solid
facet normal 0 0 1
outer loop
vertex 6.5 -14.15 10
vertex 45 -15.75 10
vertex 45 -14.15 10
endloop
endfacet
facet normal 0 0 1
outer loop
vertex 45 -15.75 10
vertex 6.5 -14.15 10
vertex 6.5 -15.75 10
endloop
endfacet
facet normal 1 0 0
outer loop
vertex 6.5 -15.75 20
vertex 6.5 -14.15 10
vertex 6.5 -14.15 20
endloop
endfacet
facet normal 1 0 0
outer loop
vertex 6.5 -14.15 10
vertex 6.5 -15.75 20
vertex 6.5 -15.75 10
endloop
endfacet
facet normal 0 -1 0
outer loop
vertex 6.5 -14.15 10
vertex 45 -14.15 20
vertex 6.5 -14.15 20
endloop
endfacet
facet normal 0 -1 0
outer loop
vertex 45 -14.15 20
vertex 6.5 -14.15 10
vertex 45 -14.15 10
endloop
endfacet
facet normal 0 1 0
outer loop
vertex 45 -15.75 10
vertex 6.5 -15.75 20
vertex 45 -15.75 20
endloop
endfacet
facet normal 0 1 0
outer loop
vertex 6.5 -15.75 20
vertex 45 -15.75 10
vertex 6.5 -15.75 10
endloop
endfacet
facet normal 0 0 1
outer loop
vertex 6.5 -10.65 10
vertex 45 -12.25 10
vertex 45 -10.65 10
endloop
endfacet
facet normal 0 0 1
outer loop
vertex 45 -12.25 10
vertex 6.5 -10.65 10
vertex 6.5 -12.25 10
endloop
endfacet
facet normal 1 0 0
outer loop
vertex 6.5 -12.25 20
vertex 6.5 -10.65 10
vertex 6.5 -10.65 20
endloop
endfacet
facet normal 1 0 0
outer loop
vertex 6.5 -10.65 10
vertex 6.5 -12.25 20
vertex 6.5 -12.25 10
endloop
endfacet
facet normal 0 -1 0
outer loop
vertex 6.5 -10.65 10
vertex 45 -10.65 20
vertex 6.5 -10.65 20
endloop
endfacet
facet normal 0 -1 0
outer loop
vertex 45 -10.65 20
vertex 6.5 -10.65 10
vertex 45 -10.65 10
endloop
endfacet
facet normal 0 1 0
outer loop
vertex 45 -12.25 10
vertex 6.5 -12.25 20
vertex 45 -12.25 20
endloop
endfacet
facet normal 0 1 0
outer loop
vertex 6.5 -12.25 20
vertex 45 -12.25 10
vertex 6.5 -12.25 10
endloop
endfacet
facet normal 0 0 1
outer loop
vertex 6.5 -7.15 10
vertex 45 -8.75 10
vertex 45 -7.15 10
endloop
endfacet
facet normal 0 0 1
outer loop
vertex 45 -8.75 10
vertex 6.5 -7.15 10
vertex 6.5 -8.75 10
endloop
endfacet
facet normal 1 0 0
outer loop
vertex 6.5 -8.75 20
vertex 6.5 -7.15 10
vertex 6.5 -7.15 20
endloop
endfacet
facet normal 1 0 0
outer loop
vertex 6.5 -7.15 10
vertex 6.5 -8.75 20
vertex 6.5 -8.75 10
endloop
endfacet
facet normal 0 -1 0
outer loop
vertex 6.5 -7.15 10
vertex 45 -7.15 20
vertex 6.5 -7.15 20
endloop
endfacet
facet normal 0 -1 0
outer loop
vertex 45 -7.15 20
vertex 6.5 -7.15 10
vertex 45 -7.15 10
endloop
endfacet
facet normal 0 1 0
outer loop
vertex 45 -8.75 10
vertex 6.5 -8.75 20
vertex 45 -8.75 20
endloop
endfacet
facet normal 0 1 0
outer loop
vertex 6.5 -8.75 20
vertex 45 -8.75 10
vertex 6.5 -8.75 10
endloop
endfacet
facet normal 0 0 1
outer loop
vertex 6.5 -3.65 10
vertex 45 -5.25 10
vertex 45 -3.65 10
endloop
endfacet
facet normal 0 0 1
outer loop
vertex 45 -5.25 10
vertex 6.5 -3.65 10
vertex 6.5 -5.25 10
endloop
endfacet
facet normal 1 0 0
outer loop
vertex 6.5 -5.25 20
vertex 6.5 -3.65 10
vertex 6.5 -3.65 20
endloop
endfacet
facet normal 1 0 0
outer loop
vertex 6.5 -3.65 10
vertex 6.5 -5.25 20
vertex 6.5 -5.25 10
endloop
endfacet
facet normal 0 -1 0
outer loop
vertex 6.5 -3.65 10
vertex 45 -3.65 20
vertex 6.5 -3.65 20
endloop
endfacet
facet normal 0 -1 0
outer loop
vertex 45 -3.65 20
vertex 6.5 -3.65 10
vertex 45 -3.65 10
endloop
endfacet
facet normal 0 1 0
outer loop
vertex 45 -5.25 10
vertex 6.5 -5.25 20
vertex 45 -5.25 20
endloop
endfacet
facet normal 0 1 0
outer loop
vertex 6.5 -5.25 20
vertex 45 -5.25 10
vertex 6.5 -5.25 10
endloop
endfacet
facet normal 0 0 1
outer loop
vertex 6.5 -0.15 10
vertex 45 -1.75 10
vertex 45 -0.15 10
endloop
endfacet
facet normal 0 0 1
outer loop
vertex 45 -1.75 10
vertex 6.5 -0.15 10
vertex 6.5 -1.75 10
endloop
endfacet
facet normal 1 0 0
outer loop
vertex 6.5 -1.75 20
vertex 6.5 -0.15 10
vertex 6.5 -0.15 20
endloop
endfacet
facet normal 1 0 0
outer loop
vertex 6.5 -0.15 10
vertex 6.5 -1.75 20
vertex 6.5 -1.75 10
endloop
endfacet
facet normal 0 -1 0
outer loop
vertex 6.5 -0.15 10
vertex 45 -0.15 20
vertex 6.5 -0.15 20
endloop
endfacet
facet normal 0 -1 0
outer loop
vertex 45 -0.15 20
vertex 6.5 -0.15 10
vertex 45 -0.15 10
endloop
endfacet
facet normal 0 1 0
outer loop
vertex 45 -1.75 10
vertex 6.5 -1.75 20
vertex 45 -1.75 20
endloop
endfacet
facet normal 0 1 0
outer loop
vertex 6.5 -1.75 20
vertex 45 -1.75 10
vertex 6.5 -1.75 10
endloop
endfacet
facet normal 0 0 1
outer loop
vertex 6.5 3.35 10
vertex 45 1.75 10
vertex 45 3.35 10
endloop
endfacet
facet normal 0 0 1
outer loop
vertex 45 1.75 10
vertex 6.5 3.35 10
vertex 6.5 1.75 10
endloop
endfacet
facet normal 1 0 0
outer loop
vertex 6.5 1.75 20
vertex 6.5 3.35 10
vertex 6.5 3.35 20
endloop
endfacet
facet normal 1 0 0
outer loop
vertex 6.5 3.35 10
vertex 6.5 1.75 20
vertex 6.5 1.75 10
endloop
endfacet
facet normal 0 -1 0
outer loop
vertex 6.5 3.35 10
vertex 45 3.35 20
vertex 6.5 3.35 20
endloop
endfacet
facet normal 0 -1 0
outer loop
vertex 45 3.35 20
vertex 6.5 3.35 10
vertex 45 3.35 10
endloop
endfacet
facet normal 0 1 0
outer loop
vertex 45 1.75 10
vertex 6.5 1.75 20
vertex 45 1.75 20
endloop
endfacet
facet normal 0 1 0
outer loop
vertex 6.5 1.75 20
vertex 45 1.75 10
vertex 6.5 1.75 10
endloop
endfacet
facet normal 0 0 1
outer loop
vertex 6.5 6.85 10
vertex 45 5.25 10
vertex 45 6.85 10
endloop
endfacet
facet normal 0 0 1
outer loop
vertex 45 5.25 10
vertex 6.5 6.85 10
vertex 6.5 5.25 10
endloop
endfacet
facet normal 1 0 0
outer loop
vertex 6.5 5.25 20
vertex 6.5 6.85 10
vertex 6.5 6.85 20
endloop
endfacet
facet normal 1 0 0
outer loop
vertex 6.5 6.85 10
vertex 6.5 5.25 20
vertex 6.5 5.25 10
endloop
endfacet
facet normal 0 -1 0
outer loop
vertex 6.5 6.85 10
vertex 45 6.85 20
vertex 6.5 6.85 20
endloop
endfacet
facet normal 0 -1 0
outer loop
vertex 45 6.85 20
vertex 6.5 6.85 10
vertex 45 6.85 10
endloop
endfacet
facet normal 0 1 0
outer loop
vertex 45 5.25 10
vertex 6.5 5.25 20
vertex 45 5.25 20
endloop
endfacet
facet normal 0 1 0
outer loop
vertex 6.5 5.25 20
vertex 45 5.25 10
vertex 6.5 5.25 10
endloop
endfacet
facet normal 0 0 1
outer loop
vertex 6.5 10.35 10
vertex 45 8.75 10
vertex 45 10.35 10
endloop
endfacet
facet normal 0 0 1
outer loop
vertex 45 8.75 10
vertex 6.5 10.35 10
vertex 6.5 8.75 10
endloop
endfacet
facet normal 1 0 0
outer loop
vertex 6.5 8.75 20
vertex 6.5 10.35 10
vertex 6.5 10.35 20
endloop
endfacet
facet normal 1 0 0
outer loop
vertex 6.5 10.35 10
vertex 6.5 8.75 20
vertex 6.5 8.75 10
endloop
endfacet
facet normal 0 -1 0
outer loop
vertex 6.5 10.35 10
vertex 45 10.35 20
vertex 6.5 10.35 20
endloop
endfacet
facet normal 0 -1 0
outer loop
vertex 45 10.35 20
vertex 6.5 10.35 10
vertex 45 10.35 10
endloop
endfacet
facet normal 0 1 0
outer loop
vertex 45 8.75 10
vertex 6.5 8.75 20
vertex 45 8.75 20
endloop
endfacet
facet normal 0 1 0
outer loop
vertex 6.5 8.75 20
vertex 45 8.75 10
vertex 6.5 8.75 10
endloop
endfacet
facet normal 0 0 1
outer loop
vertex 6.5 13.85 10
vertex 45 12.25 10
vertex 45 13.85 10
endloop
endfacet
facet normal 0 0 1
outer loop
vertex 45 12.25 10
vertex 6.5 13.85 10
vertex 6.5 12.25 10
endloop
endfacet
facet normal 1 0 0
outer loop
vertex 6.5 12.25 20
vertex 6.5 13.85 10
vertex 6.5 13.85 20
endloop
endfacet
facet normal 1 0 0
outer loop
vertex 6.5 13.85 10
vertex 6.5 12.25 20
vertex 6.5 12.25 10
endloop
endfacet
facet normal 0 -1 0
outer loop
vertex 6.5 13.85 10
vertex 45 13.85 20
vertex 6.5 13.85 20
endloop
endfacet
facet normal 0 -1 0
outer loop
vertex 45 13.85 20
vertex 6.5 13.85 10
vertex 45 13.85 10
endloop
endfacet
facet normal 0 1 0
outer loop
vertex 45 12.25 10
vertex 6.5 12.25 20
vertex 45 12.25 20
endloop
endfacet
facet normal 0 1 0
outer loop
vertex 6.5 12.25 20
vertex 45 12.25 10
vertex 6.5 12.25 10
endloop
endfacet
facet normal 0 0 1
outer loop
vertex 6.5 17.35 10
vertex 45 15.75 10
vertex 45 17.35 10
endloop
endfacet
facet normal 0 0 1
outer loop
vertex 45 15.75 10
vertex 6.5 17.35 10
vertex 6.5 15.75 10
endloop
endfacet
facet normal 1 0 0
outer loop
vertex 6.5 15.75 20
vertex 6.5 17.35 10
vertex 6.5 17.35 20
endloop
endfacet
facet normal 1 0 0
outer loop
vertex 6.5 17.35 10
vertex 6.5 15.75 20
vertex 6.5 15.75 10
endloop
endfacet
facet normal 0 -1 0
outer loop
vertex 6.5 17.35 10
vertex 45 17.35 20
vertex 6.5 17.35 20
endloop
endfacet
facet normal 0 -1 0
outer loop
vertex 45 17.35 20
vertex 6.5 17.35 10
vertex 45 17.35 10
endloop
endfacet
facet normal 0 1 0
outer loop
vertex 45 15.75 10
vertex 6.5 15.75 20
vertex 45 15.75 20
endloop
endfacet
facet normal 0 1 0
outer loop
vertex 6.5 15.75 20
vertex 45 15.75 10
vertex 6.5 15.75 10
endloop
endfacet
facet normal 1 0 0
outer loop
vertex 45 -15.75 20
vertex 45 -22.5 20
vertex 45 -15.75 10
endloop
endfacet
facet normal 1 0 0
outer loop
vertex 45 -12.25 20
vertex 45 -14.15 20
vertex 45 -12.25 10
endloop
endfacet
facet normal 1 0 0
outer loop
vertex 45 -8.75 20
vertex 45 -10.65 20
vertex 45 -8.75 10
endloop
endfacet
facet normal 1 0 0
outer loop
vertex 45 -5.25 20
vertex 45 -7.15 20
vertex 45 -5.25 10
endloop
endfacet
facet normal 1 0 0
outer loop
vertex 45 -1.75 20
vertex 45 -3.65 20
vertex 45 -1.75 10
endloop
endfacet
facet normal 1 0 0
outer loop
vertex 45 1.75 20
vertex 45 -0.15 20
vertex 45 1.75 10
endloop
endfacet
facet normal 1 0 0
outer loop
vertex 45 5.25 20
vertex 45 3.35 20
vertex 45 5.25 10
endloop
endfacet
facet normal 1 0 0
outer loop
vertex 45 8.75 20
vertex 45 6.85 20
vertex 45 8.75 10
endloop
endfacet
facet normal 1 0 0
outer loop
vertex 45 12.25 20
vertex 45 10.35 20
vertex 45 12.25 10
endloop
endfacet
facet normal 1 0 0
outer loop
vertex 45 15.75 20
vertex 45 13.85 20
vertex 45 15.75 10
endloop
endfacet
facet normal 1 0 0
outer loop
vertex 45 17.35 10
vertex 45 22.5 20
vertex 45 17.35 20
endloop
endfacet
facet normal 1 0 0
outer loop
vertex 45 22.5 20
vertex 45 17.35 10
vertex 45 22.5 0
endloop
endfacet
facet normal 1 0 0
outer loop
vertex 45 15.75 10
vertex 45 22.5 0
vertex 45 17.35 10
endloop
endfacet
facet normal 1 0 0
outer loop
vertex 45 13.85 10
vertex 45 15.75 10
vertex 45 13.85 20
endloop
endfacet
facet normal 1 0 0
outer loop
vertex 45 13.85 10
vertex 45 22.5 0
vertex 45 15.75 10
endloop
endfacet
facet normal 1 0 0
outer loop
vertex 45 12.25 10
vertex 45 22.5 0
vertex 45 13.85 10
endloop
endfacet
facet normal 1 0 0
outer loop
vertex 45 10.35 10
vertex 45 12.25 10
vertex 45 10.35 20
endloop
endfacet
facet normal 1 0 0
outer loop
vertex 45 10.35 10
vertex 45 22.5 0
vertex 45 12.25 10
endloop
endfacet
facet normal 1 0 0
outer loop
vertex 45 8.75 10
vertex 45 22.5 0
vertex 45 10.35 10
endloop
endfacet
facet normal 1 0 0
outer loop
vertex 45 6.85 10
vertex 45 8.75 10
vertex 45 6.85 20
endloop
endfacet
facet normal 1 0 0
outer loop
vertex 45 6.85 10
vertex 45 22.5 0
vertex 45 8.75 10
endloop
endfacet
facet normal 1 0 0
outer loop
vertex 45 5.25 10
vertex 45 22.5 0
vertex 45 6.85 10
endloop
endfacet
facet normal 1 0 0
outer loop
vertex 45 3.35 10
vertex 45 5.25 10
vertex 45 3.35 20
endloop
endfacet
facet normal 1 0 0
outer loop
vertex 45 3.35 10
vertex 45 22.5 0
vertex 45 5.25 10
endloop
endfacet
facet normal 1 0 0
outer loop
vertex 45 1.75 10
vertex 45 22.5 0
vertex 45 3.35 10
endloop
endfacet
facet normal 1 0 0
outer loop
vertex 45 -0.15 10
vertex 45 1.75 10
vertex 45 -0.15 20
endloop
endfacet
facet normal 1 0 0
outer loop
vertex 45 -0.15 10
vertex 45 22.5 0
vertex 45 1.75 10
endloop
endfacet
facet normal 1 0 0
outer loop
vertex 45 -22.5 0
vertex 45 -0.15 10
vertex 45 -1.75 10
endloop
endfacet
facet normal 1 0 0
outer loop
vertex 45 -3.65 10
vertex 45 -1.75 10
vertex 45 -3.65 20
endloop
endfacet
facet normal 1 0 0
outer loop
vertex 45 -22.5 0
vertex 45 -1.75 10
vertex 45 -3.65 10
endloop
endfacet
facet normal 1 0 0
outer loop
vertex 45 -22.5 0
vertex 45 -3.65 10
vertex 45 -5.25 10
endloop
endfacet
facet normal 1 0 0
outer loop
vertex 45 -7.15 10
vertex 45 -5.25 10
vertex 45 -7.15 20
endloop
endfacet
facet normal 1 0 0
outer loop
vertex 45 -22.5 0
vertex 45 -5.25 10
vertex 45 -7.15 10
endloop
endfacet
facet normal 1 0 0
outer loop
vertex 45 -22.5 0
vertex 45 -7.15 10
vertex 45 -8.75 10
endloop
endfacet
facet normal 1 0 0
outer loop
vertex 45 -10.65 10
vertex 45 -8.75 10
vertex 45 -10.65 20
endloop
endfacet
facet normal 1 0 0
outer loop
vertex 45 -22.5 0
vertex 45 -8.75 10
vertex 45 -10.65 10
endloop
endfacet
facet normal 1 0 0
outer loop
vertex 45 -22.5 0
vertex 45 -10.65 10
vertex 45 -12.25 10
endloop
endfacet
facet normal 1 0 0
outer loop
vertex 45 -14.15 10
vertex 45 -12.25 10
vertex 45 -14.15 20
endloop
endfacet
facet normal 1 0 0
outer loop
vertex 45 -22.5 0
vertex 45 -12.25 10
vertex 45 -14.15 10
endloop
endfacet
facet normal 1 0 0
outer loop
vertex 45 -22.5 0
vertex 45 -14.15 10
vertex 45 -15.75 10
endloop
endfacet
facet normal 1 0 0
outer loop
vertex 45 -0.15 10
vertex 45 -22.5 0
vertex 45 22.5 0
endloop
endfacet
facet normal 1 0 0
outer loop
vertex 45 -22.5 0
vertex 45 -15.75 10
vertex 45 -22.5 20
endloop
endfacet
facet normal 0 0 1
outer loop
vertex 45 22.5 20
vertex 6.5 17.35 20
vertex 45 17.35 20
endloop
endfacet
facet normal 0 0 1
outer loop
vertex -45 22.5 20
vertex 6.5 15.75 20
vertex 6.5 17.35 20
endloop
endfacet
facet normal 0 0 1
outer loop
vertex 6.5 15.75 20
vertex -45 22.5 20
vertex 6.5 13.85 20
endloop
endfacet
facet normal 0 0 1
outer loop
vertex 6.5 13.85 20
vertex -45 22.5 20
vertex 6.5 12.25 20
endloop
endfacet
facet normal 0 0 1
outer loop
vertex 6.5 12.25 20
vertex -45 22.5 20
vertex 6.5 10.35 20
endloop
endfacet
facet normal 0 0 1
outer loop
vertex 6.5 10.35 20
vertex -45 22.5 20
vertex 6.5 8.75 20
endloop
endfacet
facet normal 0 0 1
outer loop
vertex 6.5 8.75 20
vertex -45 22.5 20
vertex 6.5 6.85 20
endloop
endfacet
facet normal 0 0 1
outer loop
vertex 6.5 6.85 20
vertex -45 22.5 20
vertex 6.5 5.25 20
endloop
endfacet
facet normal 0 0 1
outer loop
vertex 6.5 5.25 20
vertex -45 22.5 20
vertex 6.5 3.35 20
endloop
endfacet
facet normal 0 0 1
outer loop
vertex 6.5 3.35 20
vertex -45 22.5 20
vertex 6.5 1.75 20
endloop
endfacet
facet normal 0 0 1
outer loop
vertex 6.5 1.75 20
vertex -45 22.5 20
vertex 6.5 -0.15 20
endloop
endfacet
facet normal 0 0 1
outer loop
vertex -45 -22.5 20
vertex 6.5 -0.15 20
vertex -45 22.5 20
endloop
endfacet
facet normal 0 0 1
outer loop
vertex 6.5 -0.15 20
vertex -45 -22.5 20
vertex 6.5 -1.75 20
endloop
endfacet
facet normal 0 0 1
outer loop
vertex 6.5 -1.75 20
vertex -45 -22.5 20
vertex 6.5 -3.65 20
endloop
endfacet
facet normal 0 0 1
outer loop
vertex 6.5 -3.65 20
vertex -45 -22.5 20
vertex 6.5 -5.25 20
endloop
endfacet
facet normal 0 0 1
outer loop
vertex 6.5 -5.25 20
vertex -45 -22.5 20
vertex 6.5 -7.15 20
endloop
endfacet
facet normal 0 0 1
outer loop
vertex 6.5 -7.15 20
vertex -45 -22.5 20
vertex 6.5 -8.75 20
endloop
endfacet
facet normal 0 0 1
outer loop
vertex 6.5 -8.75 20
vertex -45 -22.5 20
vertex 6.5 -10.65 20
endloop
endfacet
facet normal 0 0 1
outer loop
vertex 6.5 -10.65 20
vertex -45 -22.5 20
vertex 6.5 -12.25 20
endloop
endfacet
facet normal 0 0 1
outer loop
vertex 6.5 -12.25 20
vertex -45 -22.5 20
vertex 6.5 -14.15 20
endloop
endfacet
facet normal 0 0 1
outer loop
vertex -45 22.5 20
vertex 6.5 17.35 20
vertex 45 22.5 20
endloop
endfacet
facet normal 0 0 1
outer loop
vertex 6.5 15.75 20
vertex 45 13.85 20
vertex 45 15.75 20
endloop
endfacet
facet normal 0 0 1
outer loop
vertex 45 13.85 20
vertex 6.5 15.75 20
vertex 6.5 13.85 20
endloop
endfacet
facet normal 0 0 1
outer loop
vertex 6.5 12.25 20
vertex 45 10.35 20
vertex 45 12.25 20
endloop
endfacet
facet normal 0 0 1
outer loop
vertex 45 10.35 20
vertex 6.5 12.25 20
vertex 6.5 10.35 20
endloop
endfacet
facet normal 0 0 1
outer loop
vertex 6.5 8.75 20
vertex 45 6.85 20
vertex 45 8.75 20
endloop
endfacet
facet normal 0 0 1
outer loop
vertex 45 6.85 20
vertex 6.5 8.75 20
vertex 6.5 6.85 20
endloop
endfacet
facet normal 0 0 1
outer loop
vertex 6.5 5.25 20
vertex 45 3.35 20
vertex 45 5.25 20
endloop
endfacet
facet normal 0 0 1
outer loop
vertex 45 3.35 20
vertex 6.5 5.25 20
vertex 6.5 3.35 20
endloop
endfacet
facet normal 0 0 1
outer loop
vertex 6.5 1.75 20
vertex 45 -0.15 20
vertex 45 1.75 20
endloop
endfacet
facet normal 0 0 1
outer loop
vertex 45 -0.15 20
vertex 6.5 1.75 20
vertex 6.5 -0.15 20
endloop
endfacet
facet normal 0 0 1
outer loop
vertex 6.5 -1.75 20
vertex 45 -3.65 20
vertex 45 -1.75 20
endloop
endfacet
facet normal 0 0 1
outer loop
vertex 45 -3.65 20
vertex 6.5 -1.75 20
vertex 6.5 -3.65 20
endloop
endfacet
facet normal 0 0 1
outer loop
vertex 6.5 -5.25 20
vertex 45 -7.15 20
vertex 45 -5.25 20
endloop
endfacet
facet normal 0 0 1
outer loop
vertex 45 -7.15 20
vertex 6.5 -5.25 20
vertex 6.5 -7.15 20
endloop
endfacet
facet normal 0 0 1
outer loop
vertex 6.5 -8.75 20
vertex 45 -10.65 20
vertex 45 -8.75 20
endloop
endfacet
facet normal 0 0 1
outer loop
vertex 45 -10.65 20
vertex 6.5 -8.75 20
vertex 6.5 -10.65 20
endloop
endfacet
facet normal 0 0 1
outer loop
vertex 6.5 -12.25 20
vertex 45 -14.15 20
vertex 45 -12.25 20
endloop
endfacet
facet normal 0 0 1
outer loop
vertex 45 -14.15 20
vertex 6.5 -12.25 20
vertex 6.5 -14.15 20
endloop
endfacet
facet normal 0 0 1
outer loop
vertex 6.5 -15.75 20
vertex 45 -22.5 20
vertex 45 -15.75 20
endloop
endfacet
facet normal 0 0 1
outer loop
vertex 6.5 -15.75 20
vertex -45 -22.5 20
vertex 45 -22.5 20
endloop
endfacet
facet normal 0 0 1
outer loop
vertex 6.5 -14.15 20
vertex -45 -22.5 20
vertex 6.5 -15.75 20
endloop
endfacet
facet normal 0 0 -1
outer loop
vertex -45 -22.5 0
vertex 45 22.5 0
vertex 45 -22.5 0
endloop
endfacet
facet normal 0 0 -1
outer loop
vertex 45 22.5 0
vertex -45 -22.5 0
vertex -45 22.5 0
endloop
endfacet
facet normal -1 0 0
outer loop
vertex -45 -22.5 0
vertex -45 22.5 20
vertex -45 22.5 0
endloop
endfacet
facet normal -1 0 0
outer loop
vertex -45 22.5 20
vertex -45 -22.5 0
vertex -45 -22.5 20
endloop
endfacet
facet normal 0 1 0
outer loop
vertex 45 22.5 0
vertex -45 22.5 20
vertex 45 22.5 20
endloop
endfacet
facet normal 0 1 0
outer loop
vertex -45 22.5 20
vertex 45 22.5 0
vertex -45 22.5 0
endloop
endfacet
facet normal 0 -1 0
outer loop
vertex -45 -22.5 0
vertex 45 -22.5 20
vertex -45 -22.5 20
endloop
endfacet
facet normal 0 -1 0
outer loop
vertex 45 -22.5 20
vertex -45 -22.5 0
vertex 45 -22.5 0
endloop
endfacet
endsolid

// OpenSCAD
// Slide drying rack
// Print orientation: base block on XY plane, slots open upward (+Z)

// ---------- Parameters ----------
block_len    = 90;    // block length along X (mm)
block_wid    = 45;    // block width along Y (mm)
block_ht     = 20;    // block height along Z (mm)

slot_count   = 10;    // number of slide slots
slot_len     = 77;    // slot length along X (mm)
slot_wid     = 1.6;   // slot width along Y (mm)
slot_depth   = 10;    // slot depth from top face (mm)
slot_pitch   = 3.5;   // centre-to-centre slot spacing along Y (mm)

eps          = 0.5;   // overcut past faces to avoid coplanar surfaces (mm)

$fn = 64;

// ---------- Derived ----------
slot_x0 = -(slot_len - block_len) / 2;              // first slot start X
slot_y0 = -(slot_count - 1) * slot_pitch / 2;       // first slot centre Y

// ---------- Model ----------
difference() {
    // Base block
    translate([-block_len / 2, -block_wid / 2, 0])
        cube([block_len, block_wid, block_ht]);

    // Parallel slots along X, centred on block in X and Y
    for (i = [0 : slot_count - 1]) {
        translate([slot_x0, slot_y0 + i * slot_pitch, block_ht - slot_depth])
            cube([slot_len, slot_wid, slot_depth + eps]);
    }
}
